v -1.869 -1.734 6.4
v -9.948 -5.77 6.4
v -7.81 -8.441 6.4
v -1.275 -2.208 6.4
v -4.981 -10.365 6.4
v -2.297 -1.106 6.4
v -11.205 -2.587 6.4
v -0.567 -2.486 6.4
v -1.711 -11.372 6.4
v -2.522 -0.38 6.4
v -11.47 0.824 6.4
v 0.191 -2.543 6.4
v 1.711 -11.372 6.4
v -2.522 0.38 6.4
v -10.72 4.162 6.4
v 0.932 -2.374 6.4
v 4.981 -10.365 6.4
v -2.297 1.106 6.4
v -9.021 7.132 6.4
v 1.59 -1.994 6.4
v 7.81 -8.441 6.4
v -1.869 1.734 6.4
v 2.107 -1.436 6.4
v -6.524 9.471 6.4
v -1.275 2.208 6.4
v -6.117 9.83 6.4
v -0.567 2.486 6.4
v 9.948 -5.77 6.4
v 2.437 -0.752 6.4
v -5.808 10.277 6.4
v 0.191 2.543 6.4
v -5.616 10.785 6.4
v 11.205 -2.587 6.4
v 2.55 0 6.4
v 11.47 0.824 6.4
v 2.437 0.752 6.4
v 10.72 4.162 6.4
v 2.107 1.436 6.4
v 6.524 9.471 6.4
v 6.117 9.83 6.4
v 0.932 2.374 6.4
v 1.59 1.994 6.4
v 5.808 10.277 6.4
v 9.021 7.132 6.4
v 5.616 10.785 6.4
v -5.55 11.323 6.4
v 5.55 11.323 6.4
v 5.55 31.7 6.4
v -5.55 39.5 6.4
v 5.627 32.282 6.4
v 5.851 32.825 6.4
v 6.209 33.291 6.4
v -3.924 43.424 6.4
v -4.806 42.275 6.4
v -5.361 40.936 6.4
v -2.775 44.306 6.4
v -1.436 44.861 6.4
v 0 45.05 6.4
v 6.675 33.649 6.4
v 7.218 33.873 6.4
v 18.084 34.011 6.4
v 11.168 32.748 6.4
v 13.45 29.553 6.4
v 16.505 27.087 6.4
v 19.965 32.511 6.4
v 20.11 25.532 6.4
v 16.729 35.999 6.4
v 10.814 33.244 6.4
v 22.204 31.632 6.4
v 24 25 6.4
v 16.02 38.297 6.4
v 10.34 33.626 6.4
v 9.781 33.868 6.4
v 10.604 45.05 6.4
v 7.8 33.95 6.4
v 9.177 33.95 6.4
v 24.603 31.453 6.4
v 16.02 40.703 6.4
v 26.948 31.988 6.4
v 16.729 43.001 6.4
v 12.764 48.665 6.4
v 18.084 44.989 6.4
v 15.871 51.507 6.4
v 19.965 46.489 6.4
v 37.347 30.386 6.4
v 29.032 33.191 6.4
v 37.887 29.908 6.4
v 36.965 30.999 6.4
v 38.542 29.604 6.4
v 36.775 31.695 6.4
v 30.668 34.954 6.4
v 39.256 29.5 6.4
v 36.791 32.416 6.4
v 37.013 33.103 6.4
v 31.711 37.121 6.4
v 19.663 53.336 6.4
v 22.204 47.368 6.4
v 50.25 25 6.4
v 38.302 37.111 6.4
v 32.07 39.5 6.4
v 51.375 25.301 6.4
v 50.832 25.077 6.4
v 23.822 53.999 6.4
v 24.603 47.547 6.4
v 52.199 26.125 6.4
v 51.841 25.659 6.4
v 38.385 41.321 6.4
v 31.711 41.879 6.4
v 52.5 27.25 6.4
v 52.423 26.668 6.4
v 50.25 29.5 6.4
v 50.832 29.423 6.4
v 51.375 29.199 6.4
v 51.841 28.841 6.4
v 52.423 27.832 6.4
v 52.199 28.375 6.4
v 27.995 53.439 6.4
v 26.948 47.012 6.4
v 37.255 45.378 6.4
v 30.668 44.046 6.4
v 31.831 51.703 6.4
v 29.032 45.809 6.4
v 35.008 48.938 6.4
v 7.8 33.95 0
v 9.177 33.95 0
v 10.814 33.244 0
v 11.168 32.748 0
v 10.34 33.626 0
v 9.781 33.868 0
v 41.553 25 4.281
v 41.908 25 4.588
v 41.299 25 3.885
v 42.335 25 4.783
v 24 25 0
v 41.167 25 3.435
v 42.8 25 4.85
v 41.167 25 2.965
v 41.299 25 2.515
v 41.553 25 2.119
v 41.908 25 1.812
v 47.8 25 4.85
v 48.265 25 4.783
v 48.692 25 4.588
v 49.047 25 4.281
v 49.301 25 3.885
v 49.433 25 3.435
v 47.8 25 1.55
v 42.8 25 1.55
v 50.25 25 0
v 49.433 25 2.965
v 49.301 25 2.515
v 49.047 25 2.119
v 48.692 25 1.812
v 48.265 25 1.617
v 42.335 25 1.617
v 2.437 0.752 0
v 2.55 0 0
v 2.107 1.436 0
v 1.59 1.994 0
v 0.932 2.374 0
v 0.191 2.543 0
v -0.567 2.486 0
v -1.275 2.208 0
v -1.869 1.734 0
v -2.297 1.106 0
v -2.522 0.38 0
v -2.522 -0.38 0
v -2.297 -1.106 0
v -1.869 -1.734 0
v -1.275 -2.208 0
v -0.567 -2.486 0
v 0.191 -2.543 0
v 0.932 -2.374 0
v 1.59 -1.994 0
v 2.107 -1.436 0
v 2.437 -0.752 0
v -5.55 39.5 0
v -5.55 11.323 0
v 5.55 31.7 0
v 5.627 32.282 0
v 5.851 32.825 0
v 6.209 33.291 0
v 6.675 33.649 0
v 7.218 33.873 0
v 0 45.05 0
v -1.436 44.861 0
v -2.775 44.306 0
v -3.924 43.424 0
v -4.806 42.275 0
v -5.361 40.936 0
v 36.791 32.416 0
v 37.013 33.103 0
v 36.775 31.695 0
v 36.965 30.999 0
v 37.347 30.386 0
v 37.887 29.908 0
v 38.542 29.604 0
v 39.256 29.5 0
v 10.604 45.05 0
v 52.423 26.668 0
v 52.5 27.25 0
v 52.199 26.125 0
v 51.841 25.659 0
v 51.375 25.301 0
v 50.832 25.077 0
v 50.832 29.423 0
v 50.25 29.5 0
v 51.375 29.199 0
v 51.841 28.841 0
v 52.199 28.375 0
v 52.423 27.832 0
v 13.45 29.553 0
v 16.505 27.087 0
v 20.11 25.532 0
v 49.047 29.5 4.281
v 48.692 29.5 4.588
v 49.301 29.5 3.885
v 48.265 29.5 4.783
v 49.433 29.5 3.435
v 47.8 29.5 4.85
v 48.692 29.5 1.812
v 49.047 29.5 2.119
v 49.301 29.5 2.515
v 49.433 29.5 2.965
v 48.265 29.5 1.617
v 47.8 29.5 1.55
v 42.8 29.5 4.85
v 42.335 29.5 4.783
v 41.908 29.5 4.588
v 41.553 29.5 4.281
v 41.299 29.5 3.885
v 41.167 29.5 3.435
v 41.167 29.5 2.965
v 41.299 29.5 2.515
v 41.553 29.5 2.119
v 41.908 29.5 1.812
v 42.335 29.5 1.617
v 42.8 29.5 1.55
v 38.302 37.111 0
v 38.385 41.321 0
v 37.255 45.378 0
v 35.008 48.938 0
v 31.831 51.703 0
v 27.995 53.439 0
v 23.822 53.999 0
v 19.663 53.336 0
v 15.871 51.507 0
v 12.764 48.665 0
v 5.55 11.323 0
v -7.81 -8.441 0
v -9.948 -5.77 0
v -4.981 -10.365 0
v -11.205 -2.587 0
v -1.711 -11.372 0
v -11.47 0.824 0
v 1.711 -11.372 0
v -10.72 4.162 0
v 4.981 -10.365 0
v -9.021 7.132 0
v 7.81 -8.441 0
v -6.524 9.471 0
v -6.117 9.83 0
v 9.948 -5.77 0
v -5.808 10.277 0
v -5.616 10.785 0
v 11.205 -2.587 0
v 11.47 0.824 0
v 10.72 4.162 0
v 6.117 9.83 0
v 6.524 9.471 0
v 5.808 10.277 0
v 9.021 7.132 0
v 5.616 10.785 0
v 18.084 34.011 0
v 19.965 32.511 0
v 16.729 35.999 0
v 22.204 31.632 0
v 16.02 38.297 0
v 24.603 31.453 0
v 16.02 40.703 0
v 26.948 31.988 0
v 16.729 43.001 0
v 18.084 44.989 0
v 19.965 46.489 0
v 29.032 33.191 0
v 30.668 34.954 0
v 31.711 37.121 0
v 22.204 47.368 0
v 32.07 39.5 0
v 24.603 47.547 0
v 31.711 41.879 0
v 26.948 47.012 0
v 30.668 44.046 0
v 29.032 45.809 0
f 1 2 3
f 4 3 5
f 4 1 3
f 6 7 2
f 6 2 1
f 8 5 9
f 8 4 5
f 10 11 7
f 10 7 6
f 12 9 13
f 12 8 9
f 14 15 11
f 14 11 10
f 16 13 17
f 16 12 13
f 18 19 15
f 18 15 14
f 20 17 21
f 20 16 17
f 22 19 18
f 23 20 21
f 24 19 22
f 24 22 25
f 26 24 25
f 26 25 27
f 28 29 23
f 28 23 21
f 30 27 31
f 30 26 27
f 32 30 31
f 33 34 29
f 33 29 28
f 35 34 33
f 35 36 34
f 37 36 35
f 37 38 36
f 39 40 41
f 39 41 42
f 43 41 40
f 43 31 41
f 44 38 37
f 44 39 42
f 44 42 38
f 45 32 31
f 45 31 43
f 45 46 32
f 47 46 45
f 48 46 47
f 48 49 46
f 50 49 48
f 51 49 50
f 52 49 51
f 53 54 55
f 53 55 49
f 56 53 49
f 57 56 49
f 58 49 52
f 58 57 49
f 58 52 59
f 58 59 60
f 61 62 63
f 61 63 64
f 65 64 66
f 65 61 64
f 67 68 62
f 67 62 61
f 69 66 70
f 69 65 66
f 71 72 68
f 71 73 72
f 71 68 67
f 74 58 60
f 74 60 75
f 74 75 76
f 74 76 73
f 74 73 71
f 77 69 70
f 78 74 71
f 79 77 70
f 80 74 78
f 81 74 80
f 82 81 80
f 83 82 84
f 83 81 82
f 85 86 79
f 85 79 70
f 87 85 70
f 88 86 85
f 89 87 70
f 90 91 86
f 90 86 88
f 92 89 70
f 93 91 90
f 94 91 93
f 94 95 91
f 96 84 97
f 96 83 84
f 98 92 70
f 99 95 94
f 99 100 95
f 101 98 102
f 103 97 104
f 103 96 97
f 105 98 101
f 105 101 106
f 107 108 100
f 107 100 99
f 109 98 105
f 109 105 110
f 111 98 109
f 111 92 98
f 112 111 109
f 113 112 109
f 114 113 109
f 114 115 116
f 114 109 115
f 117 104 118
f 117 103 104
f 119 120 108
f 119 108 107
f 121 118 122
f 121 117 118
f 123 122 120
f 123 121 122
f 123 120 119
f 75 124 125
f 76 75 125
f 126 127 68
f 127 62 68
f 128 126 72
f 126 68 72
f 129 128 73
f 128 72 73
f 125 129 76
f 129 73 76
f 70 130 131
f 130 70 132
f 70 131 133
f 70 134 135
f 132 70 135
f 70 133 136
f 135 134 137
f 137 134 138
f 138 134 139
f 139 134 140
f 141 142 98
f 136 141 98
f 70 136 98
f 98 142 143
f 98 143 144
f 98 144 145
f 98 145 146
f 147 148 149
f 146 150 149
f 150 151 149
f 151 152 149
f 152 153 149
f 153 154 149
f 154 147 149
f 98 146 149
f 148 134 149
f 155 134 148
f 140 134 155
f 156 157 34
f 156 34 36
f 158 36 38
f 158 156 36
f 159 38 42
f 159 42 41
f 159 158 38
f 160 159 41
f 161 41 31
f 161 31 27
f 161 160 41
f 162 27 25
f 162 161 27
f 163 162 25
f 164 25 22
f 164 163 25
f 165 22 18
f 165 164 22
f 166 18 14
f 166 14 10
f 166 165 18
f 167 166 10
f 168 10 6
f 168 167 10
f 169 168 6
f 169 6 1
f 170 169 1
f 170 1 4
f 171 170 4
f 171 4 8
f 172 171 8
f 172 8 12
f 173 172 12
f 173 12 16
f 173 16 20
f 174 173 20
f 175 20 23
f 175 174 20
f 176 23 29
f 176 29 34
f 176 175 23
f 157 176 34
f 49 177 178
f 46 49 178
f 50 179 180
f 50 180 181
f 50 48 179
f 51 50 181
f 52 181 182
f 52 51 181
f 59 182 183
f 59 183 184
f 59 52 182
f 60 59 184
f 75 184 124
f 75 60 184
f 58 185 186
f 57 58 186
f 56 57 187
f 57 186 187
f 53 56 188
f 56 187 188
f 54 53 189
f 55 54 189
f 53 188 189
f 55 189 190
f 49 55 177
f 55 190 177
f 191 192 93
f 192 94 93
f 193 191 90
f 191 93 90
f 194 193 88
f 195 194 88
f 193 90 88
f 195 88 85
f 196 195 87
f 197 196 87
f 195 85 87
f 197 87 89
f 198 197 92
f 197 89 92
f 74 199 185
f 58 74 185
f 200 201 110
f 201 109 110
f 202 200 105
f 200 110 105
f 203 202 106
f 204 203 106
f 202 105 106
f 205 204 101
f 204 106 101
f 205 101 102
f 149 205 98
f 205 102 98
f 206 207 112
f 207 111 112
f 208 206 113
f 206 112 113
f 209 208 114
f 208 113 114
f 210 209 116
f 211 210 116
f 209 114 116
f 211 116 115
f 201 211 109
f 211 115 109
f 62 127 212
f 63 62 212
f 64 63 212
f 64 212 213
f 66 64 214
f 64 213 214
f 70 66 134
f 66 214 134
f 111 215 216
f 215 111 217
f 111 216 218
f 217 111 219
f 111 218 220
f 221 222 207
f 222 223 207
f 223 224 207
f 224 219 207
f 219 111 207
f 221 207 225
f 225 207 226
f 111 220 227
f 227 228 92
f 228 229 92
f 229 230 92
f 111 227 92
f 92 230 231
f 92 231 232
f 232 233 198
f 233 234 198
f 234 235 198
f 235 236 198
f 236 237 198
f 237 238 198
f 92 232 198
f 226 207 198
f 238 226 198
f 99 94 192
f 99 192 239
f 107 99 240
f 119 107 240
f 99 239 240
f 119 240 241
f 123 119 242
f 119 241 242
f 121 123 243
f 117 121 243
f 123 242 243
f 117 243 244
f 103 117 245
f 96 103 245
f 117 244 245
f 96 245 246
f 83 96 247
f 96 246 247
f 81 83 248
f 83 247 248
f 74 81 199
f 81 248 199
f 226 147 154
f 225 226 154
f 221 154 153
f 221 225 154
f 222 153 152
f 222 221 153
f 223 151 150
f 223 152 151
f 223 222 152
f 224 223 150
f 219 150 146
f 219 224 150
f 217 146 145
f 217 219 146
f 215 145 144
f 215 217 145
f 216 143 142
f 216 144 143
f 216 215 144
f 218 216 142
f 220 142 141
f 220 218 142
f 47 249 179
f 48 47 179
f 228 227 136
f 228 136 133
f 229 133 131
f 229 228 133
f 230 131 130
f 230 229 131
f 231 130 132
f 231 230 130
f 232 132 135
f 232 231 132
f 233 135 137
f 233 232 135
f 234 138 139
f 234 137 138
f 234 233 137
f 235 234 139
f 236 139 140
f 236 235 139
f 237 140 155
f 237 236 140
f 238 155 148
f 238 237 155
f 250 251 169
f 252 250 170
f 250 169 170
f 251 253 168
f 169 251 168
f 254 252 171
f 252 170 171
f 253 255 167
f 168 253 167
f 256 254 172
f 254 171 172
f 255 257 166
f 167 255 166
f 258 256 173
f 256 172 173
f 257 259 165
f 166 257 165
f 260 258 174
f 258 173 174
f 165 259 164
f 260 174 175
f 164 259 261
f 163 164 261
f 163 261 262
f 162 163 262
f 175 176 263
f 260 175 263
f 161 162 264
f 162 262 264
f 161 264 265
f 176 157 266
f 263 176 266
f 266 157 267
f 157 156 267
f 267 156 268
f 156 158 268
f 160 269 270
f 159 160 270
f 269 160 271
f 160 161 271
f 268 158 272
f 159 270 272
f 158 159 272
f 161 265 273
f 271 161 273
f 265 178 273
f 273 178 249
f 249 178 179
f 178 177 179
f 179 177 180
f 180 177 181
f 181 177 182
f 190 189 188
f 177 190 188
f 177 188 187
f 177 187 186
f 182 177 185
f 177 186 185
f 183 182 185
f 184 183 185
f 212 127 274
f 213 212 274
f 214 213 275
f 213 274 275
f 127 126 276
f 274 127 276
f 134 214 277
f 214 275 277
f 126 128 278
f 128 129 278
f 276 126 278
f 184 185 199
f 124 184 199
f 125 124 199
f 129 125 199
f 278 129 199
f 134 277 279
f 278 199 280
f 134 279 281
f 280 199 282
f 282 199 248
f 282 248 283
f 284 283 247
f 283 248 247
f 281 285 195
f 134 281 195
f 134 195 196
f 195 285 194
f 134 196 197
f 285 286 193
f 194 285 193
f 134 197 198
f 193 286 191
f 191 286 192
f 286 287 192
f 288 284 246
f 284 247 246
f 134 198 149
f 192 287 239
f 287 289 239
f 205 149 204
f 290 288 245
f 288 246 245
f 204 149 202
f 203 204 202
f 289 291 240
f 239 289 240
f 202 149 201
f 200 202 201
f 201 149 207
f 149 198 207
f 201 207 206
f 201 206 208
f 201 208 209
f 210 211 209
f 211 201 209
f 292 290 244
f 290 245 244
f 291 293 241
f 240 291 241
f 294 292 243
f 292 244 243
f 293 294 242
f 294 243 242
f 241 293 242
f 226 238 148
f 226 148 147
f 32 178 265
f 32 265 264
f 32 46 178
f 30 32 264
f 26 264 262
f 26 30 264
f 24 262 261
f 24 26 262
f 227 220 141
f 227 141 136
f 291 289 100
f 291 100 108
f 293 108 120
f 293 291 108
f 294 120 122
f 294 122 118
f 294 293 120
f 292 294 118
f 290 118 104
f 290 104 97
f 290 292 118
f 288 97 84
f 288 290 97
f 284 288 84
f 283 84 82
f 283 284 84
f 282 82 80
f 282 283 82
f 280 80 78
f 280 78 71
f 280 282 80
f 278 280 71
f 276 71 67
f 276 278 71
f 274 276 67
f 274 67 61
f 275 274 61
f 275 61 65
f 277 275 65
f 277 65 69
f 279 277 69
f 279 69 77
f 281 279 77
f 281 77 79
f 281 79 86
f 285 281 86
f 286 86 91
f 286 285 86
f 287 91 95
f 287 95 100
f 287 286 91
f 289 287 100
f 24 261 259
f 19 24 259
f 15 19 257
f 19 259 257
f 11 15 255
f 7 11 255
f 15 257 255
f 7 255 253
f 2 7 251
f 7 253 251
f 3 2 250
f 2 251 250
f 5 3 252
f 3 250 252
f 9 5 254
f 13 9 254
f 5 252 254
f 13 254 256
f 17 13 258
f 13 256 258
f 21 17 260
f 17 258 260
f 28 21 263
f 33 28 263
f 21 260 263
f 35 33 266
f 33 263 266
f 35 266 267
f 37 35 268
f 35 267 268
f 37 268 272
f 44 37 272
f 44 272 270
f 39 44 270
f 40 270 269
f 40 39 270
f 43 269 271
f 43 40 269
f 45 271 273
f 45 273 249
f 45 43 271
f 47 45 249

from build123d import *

# Parameters (mm, degrees)
SKETCH1_R           = 2.55
SKETCH1_R_2         = 8.07
BOSS_EXTRUDE3_DEPTH = 6.4
CUT_EXTRUDE1_DEPTH  = 16
FILLET1_R           = 2.5
FILLET2_R           = 2.25


with BuildPart() as part:
    # Sketch1 → Boss-Extrude3 (new body)
    with BuildSketch(Plane.XY):
        with BuildLine():
            ThreePointArc((-5.55, 10.072114972), (0, -11.5), (5.55, 10.072114972))
            Line((5.55, 10.072114972), (5.55, 33.95))
            Line((5.55, 33.95), (10.604198419, 33.95))
            ThreePointArc((10.604198419, 33.95), (15.944722227, 27.443362824), (24, 25))
            Line((24, 25), (52.5, 25))
            Line((52.5, 25), (52.5, 29.5))
            Line((52.5, 29.5), (34.5, 29.5))
            ThreePointArc((34.5, 29.5), (31.908668769, 51.65331059), (10.604198419, 45.05))
            Line((10.604198419, 45.05), (0, 45.05))
            ThreePointArc((0, 45.05), (-3.924442636, 43.424442636), (-5.55, 39.5))
            Line((-5.55, 39.5), (-5.55, 10.072114972))
        make_face()
        Circle(SKETCH1_R, mode=Mode.SUBTRACT)
        with Locations((24, 39.5)):
            Circle(SKETCH1_R_2, mode=Mode.SUBTRACT)
    extrude(amount=BOSS_EXTRUDE3_DEPTH)

    # Sketch2 → Cut-Extrude1 (cut)
    with BuildSketch(Plane(origin=(0, 29.5, 0), x_dir=(1, 0, 0), z_dir=(0, 1, 0))):
        with BuildLine():
            Line((42.8, -1.55), (47.8, -1.55))
            ThreePointArc((47.8, -1.55), (49.45, -3.2), (47.8, -4.85))
            Line((47.8, -4.85), (42.8, -4.85))
            ThreePointArc((42.8, -4.85), (41.15, -3.2), (42.8, -1.55))
        make_face()
    extrude(amount=-CUT_EXTRUDE1_DEPTH, mode=Mode.SUBTRACT)

    # Fillet1
    fillet1_edges = [part.edges().sort_by_distance(p)[0] for p in [
        (34.5, 29.5, 3.2),
    ]]
    fillet(fillet1_edges, radius=FILLET1_R)

    # Fillet2
    fillet2_edges = [part.edges().sort_by_distance(p)[0] for p in [
        (10.604198419, 33.95, 3.2),
        (-5.55, 10.072114972, 3.2),
        (5.55, 10.072114972, 3.2),
        (5.55, 33.95, 3.2),
        (52.5, 25, 3.2),
        (52.5, 29.5, 3.2),
    ]]
    fillet(fillet2_edges, radius=FILLET2_R - 0.0001)  # a hair under: the kernel refuses the full size


solid = part.part
